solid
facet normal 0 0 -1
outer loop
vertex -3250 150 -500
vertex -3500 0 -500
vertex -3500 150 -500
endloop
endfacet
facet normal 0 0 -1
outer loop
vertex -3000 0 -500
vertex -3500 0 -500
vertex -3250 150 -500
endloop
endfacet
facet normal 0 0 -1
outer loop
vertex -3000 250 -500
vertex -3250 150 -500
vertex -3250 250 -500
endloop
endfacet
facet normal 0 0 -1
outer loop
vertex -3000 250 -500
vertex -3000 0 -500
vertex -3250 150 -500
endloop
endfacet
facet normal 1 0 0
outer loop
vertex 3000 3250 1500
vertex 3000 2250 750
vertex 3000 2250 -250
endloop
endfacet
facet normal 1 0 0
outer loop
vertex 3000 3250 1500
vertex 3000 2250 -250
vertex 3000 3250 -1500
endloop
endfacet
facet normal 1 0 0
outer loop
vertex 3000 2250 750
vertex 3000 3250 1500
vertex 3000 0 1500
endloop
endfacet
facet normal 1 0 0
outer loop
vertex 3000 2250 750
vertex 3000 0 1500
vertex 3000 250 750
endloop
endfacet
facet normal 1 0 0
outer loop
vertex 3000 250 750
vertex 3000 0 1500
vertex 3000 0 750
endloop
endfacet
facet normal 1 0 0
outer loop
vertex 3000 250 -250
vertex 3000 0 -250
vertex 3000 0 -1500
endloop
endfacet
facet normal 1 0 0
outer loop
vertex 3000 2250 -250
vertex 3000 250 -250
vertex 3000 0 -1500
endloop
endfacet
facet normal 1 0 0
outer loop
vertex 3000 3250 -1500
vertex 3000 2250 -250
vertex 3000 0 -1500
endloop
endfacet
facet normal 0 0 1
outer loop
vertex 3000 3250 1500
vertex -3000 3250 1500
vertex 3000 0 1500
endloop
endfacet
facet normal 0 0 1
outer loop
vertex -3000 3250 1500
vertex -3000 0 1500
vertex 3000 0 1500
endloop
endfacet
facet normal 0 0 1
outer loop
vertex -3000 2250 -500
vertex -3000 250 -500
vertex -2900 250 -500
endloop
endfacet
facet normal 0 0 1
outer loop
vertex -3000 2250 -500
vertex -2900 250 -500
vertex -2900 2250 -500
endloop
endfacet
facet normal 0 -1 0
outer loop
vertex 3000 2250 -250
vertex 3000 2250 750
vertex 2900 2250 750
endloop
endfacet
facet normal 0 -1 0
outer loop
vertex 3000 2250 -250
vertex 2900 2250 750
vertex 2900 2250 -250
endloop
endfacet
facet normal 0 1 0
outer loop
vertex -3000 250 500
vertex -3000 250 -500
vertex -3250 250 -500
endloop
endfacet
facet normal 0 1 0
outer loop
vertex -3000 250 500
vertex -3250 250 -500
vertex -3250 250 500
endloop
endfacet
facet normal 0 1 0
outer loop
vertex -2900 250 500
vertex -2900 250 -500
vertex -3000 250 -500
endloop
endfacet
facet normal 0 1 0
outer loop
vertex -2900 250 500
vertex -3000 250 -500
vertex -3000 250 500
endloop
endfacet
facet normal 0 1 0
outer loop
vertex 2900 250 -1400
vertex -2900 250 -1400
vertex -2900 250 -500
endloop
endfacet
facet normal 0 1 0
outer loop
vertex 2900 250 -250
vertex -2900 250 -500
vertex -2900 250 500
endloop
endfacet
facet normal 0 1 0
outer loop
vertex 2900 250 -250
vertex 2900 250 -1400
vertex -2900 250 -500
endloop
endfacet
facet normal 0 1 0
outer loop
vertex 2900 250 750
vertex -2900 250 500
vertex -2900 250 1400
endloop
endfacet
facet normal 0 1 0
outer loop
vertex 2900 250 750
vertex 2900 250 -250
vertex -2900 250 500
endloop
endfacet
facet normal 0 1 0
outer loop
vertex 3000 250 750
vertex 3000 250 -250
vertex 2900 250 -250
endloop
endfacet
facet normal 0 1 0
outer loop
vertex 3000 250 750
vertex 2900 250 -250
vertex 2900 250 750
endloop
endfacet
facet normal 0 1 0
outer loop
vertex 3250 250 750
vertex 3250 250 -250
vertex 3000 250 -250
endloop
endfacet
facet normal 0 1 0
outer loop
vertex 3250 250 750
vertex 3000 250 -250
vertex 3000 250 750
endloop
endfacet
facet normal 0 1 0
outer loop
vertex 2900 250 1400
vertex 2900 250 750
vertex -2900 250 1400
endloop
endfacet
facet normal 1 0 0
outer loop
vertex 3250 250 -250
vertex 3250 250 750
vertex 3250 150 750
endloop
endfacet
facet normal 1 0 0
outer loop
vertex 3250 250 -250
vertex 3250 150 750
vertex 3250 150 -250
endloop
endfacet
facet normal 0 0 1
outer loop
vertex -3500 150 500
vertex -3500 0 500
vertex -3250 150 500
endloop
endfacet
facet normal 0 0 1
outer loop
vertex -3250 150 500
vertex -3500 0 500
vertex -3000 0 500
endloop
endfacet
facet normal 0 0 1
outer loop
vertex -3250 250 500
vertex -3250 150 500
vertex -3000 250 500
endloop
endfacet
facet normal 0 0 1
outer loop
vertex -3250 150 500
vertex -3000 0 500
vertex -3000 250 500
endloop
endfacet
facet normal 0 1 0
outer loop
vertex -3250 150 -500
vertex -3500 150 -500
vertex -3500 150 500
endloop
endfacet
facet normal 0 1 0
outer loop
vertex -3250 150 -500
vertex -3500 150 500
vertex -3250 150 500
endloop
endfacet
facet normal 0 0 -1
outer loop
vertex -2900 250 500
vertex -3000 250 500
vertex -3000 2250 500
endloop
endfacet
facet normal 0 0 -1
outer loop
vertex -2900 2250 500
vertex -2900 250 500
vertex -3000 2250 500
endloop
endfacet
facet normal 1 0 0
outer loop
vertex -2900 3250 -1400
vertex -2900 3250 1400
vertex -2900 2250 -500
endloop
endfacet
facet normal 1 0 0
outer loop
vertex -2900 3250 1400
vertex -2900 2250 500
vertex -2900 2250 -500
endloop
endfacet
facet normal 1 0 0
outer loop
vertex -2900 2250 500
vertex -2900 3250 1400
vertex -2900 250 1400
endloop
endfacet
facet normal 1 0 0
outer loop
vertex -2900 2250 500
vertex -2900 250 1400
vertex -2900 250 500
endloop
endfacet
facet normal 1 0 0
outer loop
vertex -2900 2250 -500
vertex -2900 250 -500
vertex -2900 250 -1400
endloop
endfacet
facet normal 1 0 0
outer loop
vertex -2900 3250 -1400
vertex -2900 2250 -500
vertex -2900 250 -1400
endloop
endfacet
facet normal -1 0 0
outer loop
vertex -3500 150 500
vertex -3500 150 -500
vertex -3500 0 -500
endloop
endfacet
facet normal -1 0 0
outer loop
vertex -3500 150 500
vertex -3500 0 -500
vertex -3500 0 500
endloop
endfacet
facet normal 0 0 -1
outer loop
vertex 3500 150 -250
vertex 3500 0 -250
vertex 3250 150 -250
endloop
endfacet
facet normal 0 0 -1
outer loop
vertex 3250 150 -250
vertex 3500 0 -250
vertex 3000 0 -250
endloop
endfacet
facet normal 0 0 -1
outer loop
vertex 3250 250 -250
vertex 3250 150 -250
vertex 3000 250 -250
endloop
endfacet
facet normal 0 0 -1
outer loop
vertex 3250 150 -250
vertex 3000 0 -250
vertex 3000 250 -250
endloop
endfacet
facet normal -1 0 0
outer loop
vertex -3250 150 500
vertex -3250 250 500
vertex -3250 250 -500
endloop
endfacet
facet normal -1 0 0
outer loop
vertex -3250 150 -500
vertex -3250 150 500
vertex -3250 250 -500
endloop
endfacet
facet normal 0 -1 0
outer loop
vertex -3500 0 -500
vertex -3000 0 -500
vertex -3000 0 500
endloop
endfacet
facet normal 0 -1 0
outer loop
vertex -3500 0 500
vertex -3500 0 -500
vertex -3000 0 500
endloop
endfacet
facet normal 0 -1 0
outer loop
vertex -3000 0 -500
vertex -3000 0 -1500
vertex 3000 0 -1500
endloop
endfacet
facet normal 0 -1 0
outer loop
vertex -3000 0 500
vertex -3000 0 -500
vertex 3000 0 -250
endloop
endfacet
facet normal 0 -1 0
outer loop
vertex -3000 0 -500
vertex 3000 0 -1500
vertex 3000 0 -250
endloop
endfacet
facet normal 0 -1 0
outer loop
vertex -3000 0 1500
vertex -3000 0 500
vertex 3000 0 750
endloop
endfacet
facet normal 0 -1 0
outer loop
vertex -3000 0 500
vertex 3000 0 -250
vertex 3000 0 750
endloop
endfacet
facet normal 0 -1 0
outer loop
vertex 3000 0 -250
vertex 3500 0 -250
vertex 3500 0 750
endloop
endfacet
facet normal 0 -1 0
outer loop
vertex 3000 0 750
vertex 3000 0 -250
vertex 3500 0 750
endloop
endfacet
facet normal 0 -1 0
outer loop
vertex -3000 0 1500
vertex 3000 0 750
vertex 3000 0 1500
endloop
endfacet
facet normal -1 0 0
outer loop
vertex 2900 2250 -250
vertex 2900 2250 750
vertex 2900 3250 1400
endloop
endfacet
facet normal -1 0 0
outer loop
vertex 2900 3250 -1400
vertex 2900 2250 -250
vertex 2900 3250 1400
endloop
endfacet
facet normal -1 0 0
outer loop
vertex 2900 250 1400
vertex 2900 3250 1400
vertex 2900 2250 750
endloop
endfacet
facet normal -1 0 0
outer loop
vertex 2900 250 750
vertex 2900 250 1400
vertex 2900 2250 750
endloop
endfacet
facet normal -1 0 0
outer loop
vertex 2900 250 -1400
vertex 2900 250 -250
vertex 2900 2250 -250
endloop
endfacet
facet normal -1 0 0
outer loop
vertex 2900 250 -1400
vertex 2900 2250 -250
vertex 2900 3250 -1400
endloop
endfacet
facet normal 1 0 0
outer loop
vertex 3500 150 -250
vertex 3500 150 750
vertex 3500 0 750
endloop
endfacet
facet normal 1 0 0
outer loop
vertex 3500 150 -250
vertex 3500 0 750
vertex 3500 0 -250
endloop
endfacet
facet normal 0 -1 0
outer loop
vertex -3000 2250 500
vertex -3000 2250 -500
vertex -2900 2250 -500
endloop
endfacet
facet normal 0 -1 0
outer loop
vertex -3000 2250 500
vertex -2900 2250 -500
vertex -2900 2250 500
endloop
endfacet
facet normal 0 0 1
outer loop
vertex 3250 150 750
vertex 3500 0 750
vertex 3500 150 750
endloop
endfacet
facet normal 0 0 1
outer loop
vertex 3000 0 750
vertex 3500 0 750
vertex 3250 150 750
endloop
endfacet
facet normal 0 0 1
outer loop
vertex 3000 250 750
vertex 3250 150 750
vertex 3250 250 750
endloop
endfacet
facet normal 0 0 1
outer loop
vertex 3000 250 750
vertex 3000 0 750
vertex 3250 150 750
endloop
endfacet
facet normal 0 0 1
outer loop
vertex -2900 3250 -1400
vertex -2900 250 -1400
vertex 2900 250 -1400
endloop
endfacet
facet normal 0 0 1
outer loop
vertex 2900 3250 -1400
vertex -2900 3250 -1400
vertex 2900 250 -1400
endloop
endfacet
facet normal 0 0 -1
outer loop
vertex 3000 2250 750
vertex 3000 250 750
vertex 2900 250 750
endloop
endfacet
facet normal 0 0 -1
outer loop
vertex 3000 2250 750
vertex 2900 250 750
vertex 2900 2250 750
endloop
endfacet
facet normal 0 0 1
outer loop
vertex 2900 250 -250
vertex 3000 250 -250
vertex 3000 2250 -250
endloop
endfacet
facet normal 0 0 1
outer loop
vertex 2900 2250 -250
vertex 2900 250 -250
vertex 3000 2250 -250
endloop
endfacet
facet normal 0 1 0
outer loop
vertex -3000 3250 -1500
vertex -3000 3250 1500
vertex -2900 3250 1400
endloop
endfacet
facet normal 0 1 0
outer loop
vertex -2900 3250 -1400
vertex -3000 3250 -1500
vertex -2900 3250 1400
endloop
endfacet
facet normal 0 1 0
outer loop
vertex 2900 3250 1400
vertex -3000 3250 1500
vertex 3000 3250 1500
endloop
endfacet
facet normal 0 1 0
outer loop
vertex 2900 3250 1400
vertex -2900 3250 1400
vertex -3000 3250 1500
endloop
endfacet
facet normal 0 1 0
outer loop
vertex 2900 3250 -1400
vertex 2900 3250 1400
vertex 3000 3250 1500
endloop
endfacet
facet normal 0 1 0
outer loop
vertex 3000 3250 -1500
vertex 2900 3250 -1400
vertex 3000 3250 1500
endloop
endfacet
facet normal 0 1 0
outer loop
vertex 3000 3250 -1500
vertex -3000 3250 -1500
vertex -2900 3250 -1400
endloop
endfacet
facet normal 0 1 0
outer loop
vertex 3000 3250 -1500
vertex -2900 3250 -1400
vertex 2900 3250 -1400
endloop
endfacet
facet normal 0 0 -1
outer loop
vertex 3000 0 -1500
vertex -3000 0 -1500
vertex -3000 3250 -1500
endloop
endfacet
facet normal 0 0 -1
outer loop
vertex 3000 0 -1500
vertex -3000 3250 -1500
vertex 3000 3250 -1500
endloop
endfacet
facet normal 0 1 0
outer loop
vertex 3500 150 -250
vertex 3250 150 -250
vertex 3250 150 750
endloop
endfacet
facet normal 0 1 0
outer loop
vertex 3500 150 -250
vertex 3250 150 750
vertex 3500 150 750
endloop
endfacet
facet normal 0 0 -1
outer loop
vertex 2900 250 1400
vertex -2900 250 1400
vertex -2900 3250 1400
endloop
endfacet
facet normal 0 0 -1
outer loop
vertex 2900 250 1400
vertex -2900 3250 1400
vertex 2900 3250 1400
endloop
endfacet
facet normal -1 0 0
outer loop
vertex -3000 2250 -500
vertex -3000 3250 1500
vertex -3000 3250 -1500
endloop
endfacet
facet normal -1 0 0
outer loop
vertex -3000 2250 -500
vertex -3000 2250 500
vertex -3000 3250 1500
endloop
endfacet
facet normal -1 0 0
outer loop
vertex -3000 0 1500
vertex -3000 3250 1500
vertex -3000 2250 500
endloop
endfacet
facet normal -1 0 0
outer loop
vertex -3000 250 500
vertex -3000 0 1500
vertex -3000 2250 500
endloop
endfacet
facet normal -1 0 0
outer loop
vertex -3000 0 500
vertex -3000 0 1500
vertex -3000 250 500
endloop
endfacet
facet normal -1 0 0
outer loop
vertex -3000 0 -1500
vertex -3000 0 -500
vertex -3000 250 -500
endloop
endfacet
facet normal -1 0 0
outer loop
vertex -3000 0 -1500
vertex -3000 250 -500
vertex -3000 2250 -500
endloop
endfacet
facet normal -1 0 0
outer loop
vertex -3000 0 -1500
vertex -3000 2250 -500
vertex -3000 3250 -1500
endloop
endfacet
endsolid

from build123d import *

# Parameters (mm, degrees)
SKETCH1_W           = 6000
SKETCH1_H           = 3000
BOSS_EXTRUDE1_DEPTH = 250
SKETCH2_W           = 6000
SKETCH2_H           = 3000
SKETCH2_W_2         = 5800
SKETCH2_H_2         = 2800
BOSS_EXTRUDE2_DEPTH = 3000
SKETCH3_W           = 1000
SKETCH3_H           = 2000
CUT_EXTRUDE1_DEPTH  = 250
SKETCH4_W           = 1000
SKETCH4_H           = 2000
CUT_EXTRUDE2_DEPTH  = 250
SKETCH6_W           = 1000
SKETCH6_H           = 250
BOSS_EXTRUDE4_DEPTH = 500
SKETCH7_W           = 1000
SKETCH7_H           = 250
BOSS_EXTRUDE5_DEPTH = 500
SKETCH8_W           = 250
SKETCH8_H           = 1000
CUT_EXTRUDE4_DEPTH  = 100
SKETCH9_W           = 250
SKETCH9_H           = 1000
CUT_EXTRUDE5_DEPTH  = 100


with BuildPart() as part:
    # Sketch1 → Boss-Extrude1 (new body)
    with BuildSketch(Plane(origin=(0, 0, 0), x_dir=(1, 0, 0), z_dir=(0, 1, 0))):
        Rectangle(SKETCH1_W, SKETCH1_H)
    extrude(amount=BOSS_EXTRUDE1_DEPTH)

    # Sketch2 → Boss-Extrude2 (add)
    with BuildSketch(Plane(origin=(0, 250, 0), x_dir=(1, 0, 0), z_dir=(0, 1, 0))):
        Rectangle(SKETCH2_W, SKETCH2_H)
        Rectangle(SKETCH2_W_2, SKETCH2_H_2, mode=Mode.SUBTRACT)
    extrude(amount=BOSS_EXTRUDE2_DEPTH)

    # Sketch3 → Cut-Extrude1 (cut)
    with BuildSketch(Plane.ZY.offset(3000)):
        with Locations((0, 1250)):
            Rectangle(SKETCH3_W, SKETCH3_H)
    extrude(amount=-CUT_EXTRUDE1_DEPTH, mode=Mode.SUBTRACT)

    # Sketch4 → Cut-Extrude2 (cut)
    with BuildSketch(Plane(origin=(3000, 0, 0), x_dir=(0, 0, -1), z_dir=(1, 0, 0))):
        with Locations((-250, 1250)):
            Rectangle(SKETCH4_W, SKETCH4_H)
    extrude(amount=-CUT_EXTRUDE2_DEPTH, mode=Mode.SUBTRACT)

    # Sketch6 → Boss-Extrude4 (add)
    with BuildSketch(Plane(origin=(3000, 0, 0), x_dir=(0, 0, -1), z_dir=(1, 0, 0))):
        with Locations((-250, 125)):
            Rectangle(SKETCH6_W, SKETCH6_H)
    extrude(amount=BOSS_EXTRUDE4_DEPTH)

    # Sketch7 → Boss-Extrude5 (add)
    with BuildSketch(Plane.ZY.offset(3000)):
        with Locations((0, 125)):
            Rectangle(SKETCH7_W, SKETCH7_H)
    extrude(amount=BOSS_EXTRUDE5_DEPTH)

    # Sketch8 → Cut-Extrude4 (cut)
    with BuildSketch(Plane(origin=(0, 250, 0), x_dir=(1, 0, 0), z_dir=(0, 1, 0))):
        with Locations((3375, -250)):
            Rectangle(SKETCH8_W, SKETCH8_H)
    extrude(amount=-CUT_EXTRUDE4_DEPTH, mode=Mode.SUBTRACT)

    # Sketch9 → Cut-Extrude5 (cut)
    with BuildSketch(Plane(origin=(0, 250, 0), x_dir=(1, 0, 0), z_dir=(0, 1, 0))):
        with Locations((-3375, 0)):
            Rectangle(SKETCH9_W, SKETCH9_H)
    extrude(amount=-CUT_EXTRUDE5_DEPTH, mode=Mode.SUBTRACT)


solid = part.part
